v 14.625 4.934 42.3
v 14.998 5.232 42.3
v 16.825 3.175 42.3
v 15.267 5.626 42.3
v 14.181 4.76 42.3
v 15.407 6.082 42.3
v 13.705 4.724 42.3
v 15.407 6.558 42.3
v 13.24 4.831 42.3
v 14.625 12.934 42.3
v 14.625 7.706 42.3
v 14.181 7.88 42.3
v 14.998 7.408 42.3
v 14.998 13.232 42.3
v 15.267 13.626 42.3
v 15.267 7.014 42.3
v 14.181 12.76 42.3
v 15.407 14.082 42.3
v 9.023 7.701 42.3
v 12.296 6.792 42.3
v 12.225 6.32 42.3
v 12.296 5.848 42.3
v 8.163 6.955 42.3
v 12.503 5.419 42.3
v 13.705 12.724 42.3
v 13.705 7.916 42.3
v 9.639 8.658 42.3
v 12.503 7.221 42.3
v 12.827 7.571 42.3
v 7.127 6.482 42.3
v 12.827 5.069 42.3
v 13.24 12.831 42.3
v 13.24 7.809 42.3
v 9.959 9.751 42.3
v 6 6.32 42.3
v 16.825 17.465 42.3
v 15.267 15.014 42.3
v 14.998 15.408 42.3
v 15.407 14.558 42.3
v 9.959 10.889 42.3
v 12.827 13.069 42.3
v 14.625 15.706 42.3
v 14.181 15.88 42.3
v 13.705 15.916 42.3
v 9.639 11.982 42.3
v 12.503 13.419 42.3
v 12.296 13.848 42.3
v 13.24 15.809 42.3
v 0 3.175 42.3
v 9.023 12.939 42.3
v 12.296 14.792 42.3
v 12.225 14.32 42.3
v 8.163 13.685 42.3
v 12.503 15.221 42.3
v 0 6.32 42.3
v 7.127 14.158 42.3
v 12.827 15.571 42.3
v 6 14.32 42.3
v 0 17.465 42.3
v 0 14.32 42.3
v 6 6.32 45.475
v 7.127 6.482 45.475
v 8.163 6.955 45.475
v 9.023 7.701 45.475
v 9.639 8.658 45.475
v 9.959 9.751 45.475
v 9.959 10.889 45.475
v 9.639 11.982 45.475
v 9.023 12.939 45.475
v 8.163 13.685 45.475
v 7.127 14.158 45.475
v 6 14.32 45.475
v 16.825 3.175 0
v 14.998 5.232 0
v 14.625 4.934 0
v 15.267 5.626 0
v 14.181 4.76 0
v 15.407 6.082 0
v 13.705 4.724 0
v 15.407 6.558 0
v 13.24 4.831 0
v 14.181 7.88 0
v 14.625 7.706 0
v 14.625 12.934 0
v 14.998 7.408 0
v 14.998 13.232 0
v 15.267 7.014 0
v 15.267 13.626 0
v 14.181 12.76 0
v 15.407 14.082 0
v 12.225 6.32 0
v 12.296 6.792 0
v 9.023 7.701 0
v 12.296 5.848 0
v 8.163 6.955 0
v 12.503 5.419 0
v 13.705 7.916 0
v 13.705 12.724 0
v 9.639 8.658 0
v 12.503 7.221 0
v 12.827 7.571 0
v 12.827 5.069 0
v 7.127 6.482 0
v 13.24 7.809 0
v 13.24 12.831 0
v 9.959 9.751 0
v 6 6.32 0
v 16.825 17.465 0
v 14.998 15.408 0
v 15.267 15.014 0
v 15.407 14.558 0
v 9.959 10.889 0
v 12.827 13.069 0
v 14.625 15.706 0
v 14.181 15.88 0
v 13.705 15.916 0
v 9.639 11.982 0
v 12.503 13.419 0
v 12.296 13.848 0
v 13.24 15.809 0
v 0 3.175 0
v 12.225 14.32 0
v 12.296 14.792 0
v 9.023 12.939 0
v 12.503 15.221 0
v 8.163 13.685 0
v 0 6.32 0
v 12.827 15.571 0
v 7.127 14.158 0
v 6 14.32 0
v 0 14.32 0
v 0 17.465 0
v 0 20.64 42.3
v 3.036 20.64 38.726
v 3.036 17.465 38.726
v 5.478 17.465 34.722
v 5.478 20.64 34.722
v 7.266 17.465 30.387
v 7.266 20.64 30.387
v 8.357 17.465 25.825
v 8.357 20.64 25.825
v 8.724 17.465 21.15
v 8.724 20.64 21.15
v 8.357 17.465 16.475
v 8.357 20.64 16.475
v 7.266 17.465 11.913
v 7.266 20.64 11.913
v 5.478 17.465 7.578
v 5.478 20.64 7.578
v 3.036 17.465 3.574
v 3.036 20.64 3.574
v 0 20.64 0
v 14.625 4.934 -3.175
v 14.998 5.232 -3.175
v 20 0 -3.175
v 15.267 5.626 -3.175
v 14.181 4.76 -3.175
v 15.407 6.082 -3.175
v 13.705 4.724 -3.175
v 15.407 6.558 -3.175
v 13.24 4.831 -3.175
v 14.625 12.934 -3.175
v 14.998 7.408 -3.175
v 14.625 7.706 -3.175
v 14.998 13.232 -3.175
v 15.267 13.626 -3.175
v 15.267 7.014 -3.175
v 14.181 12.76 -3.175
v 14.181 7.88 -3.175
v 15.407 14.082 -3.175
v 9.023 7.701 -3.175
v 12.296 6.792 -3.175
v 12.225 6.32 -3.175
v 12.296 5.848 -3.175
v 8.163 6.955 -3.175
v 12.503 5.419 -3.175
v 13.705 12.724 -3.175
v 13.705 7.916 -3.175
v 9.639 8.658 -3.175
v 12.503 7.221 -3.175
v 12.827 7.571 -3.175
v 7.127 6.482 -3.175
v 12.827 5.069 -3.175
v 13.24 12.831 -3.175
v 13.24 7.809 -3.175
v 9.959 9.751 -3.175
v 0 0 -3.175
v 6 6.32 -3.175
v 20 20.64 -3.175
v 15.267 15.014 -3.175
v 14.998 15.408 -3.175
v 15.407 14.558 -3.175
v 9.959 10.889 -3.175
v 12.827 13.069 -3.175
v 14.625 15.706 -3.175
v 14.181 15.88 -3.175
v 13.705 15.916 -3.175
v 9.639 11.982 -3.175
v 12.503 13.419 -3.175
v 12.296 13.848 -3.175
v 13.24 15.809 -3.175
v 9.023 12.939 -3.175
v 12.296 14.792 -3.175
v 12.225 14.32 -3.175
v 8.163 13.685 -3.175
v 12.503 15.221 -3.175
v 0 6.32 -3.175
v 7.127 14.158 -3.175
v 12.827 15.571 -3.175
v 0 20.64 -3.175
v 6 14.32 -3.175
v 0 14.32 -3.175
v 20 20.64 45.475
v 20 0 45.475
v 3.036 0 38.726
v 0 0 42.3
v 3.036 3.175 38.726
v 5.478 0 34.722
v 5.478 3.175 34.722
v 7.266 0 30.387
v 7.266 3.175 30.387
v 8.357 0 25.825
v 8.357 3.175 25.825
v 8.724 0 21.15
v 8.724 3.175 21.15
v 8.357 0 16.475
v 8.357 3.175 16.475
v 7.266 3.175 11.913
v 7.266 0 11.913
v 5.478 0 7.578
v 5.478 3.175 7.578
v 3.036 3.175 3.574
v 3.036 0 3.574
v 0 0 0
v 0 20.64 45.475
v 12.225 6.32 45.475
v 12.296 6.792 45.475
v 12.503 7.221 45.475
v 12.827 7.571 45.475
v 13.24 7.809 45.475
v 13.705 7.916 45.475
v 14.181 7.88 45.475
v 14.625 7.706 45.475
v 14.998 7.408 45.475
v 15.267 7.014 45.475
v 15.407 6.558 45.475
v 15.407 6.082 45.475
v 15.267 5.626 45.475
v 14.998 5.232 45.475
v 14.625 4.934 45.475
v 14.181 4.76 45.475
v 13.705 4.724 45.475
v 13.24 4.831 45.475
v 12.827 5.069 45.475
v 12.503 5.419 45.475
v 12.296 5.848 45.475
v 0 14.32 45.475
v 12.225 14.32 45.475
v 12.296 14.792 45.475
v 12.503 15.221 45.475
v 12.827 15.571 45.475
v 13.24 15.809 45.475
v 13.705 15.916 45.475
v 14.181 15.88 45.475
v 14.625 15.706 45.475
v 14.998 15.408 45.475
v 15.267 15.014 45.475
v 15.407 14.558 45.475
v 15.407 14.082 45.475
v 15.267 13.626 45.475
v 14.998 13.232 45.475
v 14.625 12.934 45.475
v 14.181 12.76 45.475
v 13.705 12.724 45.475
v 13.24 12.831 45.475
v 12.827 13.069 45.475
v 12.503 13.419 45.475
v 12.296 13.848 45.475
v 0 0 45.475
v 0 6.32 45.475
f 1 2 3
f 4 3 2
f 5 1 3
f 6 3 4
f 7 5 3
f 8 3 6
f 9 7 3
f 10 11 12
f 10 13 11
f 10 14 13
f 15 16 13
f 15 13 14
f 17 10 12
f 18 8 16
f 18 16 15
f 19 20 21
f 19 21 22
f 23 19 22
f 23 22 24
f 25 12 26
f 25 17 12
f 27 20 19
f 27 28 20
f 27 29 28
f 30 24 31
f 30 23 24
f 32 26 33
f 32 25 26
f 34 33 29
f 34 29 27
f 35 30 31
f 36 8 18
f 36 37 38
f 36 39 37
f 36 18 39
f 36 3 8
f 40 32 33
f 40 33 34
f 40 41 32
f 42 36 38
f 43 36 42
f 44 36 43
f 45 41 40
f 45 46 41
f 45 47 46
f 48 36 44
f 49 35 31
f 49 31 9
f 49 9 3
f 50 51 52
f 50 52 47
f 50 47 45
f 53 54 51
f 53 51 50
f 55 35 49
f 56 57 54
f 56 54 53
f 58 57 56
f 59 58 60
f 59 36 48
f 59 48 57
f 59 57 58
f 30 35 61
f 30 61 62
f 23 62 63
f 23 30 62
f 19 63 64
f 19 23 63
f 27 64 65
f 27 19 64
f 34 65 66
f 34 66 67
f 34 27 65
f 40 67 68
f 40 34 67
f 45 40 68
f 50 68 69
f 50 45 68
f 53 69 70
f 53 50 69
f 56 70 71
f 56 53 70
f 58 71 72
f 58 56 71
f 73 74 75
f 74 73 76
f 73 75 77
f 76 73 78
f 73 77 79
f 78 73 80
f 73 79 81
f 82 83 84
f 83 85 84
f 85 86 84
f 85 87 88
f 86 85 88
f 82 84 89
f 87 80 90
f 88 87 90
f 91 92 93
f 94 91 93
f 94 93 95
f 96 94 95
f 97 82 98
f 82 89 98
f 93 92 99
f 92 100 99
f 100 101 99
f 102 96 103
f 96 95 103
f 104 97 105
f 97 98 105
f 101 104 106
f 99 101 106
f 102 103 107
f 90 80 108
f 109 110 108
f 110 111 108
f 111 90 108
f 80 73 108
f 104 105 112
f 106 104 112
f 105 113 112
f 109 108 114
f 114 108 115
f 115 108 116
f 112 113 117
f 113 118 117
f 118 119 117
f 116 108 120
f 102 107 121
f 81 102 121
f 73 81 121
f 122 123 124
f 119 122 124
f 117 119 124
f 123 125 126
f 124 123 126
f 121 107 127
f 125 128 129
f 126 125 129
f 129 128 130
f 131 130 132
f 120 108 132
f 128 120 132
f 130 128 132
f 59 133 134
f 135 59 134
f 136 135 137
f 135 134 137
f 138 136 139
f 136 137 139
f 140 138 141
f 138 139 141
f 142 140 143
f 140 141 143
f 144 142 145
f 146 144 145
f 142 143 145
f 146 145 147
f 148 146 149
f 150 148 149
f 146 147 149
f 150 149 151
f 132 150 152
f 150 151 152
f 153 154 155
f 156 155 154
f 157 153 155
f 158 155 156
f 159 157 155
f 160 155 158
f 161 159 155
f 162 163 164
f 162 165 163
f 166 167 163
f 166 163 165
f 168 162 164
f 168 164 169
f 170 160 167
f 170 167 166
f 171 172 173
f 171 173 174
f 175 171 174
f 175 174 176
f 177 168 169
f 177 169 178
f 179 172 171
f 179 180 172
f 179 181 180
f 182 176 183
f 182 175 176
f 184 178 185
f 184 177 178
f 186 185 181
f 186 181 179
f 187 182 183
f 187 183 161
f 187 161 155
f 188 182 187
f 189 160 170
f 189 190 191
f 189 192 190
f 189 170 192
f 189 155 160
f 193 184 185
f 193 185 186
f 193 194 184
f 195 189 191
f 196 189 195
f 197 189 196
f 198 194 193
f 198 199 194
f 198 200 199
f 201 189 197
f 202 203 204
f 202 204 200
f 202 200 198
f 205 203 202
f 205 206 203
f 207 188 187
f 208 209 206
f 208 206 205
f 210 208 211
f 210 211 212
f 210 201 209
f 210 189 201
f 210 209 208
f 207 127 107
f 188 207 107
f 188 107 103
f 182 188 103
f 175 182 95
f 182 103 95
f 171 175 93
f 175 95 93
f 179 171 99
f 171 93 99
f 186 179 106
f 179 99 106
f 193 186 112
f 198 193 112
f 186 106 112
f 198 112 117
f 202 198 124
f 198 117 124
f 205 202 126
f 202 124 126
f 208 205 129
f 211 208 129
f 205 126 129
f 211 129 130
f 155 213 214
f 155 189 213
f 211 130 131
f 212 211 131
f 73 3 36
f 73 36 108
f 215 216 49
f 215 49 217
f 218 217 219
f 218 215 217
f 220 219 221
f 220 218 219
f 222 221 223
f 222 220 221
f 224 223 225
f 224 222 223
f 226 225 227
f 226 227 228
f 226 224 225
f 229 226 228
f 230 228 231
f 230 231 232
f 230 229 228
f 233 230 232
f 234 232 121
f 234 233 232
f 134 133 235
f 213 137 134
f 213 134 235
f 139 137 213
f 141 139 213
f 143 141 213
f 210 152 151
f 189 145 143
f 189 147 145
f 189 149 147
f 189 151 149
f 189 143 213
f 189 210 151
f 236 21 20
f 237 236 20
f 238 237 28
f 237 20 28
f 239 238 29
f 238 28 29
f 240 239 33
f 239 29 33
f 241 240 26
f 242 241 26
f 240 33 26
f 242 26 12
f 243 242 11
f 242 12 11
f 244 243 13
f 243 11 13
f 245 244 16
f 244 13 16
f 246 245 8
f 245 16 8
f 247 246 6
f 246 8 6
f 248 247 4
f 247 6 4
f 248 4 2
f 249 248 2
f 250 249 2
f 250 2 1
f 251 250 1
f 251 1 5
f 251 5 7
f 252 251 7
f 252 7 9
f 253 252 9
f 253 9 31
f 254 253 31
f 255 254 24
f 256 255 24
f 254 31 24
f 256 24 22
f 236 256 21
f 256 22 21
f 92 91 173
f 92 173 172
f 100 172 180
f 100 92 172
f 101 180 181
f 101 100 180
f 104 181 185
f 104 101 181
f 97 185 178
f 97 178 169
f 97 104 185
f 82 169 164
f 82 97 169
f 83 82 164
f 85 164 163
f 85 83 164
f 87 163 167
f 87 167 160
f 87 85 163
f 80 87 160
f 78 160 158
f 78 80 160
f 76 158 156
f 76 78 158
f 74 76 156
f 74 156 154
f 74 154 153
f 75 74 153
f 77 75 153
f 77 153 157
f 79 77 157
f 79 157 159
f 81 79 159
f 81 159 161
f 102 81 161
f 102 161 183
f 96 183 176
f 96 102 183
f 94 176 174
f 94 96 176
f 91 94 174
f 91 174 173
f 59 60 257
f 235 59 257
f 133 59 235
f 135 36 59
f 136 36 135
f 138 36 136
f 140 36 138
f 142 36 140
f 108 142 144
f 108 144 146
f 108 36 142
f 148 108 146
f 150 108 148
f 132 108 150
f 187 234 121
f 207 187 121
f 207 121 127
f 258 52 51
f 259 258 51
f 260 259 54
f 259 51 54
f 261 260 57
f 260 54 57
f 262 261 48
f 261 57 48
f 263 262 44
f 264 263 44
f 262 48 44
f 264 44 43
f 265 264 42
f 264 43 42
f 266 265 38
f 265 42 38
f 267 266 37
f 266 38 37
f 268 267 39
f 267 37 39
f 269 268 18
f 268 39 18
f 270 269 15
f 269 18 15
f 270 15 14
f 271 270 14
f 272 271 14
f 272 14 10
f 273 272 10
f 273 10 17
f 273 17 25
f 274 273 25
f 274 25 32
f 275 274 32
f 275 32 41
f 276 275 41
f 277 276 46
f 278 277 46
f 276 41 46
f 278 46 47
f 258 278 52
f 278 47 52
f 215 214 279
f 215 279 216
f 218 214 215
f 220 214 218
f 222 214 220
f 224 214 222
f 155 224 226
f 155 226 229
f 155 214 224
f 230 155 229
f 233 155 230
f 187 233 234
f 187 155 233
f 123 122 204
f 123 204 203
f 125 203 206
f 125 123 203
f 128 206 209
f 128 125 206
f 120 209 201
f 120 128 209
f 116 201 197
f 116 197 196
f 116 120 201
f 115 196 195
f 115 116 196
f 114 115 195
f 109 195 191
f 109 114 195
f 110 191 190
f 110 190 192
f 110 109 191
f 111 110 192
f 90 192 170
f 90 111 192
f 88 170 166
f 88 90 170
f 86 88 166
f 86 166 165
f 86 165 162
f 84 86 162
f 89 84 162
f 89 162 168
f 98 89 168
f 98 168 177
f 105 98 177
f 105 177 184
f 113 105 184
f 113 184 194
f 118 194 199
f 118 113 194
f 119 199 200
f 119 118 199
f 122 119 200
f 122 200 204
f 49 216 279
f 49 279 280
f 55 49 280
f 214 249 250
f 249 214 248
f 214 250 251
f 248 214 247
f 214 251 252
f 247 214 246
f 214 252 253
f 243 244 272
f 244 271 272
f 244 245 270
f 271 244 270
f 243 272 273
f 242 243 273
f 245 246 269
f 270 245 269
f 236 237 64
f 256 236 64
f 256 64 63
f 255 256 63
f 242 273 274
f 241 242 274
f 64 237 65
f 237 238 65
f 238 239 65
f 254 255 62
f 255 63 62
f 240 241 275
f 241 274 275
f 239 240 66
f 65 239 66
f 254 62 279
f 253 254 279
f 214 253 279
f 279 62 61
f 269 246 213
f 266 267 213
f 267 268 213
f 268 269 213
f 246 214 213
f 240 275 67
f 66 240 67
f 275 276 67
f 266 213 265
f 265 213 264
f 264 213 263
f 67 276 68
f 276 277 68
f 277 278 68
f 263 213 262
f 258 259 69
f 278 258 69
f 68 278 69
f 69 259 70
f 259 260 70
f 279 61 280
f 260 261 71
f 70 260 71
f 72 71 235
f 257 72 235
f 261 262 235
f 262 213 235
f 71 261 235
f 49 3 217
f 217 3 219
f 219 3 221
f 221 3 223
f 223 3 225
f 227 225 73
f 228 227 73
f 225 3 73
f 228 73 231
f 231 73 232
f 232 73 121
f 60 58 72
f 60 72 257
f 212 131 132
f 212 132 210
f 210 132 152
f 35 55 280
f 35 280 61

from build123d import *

# Parameters (mm, degrees)
BOSS_EXTRUDE1_DEPTH = 3.175
SKETCH2_W           = 3.175
SKETCH2_H           = 42.3
BOSS_EXTRUDE2_DEPTH = 14.29
SKETCH3_R           = 1.6
BOSS_EXTRUDE3_DEPTH = 3.175


with BuildPart() as part:
    # Sketch1 → Boss-Extrude1 (new body)
    with BuildSketch(Plane(origin=(0, 0, 0), x_dir=(1, 0, 0), z_dir=(0, 1, 0))):
        with BuildLine():
            Line((0, 0), (20, 0))
            Line((20, 0), (20, -42.3))
            Line((20, -42.3), (0, -42.3))
            ThreePointArc((0, -42.3), (8.723780881, -21.15), (0, 0))
        make_face()
    boss_extrude1 = extrude(amount=BOSS_EXTRUDE1_DEPTH)

    # Sketch2 → Boss-Extrude2 (add)
    with BuildSketch(Plane(origin=(0, 3.175, 0), x_dir=(1, 0, 0), z_dir=(0, 1, 0))):
        with Locations((18.4125, -21.15)):
            Rectangle(SKETCH2_W, SKETCH2_H)
    extrude(amount=BOSS_EXTRUDE2_DEPTH)

    # Mirror1: Boss-Extrude1 across plane
    add(boss_extrude1.mirror(Plane.ZX.offset(10.32)))

    # Sketch3 → Boss-Extrude3 (add)
    with BuildSketch(Plane(origin=(0, 0, 0), x_dir=(-1, 0, 0), z_dir=(0, 0, -1))):
        with BuildLine():
            Line((-20, 0), (0, 0))
            Line((0, 0), (0, 6.32))
            Line((0, 6.32), (-6, 6.32))
            ThreePointArc((-6, 6.32), (-10, 10.32), (-6, 14.32))
            Line((-6, 14.32), (0, 14.32))
            Line((0, 14.32), (0, 20.64))
            Line((0, 20.64), (-20, 20.64))
            Line((-20, 20.64), (-20, 0))
        make_face()
        with Locations((-13.825, 6.32)):
            Circle(SKETCH3_R, mode=Mode.SUBTRACT)
        with Locations((-13.825, 14.32)):
            Circle(SKETCH3_R, mode=Mode.SUBTRACT)
    boss_extrude3 = extrude(amount=BOSS_EXTRUDE3_DEPTH)

    # Mirror2: Boss-Extrude3 across plane
    add(boss_extrude3.mirror(Plane.XY.offset(21.15)))


solid = part.part
